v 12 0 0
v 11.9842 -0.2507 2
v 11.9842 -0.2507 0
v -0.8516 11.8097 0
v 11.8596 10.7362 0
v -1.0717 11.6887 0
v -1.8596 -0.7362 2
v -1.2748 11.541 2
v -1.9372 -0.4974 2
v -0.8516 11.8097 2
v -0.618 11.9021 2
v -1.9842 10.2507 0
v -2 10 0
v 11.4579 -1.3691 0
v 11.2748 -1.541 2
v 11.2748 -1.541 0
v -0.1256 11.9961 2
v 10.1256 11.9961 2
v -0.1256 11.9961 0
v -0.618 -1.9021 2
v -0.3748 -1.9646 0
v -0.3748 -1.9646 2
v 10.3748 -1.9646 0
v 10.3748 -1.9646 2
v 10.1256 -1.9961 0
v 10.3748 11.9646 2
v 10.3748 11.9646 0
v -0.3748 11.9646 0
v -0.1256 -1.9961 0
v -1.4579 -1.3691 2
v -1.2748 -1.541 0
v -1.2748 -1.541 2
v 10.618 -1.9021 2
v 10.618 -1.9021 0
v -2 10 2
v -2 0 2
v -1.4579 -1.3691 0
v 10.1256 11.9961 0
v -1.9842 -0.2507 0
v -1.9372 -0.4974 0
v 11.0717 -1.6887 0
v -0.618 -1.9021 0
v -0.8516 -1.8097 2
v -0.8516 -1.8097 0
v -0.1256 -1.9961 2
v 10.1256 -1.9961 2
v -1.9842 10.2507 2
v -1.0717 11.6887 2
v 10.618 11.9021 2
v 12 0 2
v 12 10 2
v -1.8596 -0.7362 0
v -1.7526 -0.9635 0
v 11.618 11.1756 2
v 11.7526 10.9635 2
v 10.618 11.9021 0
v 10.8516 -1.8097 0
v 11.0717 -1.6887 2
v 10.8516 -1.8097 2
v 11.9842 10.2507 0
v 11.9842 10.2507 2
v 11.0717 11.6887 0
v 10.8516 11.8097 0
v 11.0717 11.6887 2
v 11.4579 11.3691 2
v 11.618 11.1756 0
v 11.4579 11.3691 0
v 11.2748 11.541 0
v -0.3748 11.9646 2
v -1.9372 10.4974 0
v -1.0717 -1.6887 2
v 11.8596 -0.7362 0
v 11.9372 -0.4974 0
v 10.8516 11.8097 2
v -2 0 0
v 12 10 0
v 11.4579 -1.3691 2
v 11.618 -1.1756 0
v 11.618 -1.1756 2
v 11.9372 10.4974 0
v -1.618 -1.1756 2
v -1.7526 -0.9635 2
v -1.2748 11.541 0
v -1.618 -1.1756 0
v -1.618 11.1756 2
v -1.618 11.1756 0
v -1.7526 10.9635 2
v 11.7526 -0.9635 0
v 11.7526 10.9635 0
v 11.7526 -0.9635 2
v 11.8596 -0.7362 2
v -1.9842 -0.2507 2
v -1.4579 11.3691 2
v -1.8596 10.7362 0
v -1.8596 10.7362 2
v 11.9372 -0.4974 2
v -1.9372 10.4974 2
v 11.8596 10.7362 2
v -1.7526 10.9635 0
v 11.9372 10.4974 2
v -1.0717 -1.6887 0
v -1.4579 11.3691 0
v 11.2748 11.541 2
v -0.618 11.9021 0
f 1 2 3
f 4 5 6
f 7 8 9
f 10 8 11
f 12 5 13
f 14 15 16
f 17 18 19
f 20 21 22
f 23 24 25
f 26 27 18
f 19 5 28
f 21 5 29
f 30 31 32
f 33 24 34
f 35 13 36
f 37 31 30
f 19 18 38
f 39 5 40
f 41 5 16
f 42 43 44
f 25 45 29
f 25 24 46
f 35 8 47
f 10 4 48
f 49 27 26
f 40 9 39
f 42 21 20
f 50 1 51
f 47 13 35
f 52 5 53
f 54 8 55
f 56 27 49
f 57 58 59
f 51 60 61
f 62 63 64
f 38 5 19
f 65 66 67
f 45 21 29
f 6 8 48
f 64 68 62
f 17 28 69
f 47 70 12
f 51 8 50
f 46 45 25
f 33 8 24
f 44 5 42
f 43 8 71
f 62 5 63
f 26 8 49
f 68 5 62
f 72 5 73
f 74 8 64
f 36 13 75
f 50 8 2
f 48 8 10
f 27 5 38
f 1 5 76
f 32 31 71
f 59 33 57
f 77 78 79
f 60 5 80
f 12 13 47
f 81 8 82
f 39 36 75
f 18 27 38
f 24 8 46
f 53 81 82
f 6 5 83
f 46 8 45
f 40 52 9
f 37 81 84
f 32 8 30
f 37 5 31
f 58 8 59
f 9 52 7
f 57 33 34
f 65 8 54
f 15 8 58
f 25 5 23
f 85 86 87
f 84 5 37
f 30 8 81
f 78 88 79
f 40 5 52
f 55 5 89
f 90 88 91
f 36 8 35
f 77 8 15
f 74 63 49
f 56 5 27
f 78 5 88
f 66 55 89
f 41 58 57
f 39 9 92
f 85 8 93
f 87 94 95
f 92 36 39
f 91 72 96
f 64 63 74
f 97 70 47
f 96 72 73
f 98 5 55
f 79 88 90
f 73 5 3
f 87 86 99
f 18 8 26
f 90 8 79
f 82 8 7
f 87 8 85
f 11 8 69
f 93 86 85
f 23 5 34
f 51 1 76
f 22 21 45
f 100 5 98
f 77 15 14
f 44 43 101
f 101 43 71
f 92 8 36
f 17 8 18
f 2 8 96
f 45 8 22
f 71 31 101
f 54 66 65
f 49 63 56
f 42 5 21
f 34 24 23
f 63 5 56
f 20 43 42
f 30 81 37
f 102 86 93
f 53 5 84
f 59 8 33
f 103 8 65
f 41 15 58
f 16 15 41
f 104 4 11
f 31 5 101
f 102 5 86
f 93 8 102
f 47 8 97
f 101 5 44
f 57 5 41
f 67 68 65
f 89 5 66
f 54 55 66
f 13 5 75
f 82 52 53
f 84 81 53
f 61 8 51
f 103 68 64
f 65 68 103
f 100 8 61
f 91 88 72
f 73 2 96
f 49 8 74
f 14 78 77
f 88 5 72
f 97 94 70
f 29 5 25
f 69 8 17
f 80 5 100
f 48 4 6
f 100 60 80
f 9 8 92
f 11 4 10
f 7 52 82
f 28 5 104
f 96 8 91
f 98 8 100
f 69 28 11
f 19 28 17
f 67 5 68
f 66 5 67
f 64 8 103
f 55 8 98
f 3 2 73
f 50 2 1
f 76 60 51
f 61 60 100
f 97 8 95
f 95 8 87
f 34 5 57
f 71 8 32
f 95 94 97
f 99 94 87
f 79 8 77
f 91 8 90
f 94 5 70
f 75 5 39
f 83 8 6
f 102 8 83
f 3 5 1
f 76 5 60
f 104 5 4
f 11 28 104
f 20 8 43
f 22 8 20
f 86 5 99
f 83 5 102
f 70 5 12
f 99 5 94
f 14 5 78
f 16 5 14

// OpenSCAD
// See http://en.wikibooks.org/wiki/OpenSCAD_User_Manual/The_OpenSCAD_Language#minkowski
// and http://en.wikibooks.org/wiki/OpenSCAD_User_Manual/The_OpenSCAD_Language#.24fa.2C_.24fs_and_.24fn

$fn=50;
minkowski()
{
 cube([10,10,1]);
 cylinder(r=2,h=1);
}
